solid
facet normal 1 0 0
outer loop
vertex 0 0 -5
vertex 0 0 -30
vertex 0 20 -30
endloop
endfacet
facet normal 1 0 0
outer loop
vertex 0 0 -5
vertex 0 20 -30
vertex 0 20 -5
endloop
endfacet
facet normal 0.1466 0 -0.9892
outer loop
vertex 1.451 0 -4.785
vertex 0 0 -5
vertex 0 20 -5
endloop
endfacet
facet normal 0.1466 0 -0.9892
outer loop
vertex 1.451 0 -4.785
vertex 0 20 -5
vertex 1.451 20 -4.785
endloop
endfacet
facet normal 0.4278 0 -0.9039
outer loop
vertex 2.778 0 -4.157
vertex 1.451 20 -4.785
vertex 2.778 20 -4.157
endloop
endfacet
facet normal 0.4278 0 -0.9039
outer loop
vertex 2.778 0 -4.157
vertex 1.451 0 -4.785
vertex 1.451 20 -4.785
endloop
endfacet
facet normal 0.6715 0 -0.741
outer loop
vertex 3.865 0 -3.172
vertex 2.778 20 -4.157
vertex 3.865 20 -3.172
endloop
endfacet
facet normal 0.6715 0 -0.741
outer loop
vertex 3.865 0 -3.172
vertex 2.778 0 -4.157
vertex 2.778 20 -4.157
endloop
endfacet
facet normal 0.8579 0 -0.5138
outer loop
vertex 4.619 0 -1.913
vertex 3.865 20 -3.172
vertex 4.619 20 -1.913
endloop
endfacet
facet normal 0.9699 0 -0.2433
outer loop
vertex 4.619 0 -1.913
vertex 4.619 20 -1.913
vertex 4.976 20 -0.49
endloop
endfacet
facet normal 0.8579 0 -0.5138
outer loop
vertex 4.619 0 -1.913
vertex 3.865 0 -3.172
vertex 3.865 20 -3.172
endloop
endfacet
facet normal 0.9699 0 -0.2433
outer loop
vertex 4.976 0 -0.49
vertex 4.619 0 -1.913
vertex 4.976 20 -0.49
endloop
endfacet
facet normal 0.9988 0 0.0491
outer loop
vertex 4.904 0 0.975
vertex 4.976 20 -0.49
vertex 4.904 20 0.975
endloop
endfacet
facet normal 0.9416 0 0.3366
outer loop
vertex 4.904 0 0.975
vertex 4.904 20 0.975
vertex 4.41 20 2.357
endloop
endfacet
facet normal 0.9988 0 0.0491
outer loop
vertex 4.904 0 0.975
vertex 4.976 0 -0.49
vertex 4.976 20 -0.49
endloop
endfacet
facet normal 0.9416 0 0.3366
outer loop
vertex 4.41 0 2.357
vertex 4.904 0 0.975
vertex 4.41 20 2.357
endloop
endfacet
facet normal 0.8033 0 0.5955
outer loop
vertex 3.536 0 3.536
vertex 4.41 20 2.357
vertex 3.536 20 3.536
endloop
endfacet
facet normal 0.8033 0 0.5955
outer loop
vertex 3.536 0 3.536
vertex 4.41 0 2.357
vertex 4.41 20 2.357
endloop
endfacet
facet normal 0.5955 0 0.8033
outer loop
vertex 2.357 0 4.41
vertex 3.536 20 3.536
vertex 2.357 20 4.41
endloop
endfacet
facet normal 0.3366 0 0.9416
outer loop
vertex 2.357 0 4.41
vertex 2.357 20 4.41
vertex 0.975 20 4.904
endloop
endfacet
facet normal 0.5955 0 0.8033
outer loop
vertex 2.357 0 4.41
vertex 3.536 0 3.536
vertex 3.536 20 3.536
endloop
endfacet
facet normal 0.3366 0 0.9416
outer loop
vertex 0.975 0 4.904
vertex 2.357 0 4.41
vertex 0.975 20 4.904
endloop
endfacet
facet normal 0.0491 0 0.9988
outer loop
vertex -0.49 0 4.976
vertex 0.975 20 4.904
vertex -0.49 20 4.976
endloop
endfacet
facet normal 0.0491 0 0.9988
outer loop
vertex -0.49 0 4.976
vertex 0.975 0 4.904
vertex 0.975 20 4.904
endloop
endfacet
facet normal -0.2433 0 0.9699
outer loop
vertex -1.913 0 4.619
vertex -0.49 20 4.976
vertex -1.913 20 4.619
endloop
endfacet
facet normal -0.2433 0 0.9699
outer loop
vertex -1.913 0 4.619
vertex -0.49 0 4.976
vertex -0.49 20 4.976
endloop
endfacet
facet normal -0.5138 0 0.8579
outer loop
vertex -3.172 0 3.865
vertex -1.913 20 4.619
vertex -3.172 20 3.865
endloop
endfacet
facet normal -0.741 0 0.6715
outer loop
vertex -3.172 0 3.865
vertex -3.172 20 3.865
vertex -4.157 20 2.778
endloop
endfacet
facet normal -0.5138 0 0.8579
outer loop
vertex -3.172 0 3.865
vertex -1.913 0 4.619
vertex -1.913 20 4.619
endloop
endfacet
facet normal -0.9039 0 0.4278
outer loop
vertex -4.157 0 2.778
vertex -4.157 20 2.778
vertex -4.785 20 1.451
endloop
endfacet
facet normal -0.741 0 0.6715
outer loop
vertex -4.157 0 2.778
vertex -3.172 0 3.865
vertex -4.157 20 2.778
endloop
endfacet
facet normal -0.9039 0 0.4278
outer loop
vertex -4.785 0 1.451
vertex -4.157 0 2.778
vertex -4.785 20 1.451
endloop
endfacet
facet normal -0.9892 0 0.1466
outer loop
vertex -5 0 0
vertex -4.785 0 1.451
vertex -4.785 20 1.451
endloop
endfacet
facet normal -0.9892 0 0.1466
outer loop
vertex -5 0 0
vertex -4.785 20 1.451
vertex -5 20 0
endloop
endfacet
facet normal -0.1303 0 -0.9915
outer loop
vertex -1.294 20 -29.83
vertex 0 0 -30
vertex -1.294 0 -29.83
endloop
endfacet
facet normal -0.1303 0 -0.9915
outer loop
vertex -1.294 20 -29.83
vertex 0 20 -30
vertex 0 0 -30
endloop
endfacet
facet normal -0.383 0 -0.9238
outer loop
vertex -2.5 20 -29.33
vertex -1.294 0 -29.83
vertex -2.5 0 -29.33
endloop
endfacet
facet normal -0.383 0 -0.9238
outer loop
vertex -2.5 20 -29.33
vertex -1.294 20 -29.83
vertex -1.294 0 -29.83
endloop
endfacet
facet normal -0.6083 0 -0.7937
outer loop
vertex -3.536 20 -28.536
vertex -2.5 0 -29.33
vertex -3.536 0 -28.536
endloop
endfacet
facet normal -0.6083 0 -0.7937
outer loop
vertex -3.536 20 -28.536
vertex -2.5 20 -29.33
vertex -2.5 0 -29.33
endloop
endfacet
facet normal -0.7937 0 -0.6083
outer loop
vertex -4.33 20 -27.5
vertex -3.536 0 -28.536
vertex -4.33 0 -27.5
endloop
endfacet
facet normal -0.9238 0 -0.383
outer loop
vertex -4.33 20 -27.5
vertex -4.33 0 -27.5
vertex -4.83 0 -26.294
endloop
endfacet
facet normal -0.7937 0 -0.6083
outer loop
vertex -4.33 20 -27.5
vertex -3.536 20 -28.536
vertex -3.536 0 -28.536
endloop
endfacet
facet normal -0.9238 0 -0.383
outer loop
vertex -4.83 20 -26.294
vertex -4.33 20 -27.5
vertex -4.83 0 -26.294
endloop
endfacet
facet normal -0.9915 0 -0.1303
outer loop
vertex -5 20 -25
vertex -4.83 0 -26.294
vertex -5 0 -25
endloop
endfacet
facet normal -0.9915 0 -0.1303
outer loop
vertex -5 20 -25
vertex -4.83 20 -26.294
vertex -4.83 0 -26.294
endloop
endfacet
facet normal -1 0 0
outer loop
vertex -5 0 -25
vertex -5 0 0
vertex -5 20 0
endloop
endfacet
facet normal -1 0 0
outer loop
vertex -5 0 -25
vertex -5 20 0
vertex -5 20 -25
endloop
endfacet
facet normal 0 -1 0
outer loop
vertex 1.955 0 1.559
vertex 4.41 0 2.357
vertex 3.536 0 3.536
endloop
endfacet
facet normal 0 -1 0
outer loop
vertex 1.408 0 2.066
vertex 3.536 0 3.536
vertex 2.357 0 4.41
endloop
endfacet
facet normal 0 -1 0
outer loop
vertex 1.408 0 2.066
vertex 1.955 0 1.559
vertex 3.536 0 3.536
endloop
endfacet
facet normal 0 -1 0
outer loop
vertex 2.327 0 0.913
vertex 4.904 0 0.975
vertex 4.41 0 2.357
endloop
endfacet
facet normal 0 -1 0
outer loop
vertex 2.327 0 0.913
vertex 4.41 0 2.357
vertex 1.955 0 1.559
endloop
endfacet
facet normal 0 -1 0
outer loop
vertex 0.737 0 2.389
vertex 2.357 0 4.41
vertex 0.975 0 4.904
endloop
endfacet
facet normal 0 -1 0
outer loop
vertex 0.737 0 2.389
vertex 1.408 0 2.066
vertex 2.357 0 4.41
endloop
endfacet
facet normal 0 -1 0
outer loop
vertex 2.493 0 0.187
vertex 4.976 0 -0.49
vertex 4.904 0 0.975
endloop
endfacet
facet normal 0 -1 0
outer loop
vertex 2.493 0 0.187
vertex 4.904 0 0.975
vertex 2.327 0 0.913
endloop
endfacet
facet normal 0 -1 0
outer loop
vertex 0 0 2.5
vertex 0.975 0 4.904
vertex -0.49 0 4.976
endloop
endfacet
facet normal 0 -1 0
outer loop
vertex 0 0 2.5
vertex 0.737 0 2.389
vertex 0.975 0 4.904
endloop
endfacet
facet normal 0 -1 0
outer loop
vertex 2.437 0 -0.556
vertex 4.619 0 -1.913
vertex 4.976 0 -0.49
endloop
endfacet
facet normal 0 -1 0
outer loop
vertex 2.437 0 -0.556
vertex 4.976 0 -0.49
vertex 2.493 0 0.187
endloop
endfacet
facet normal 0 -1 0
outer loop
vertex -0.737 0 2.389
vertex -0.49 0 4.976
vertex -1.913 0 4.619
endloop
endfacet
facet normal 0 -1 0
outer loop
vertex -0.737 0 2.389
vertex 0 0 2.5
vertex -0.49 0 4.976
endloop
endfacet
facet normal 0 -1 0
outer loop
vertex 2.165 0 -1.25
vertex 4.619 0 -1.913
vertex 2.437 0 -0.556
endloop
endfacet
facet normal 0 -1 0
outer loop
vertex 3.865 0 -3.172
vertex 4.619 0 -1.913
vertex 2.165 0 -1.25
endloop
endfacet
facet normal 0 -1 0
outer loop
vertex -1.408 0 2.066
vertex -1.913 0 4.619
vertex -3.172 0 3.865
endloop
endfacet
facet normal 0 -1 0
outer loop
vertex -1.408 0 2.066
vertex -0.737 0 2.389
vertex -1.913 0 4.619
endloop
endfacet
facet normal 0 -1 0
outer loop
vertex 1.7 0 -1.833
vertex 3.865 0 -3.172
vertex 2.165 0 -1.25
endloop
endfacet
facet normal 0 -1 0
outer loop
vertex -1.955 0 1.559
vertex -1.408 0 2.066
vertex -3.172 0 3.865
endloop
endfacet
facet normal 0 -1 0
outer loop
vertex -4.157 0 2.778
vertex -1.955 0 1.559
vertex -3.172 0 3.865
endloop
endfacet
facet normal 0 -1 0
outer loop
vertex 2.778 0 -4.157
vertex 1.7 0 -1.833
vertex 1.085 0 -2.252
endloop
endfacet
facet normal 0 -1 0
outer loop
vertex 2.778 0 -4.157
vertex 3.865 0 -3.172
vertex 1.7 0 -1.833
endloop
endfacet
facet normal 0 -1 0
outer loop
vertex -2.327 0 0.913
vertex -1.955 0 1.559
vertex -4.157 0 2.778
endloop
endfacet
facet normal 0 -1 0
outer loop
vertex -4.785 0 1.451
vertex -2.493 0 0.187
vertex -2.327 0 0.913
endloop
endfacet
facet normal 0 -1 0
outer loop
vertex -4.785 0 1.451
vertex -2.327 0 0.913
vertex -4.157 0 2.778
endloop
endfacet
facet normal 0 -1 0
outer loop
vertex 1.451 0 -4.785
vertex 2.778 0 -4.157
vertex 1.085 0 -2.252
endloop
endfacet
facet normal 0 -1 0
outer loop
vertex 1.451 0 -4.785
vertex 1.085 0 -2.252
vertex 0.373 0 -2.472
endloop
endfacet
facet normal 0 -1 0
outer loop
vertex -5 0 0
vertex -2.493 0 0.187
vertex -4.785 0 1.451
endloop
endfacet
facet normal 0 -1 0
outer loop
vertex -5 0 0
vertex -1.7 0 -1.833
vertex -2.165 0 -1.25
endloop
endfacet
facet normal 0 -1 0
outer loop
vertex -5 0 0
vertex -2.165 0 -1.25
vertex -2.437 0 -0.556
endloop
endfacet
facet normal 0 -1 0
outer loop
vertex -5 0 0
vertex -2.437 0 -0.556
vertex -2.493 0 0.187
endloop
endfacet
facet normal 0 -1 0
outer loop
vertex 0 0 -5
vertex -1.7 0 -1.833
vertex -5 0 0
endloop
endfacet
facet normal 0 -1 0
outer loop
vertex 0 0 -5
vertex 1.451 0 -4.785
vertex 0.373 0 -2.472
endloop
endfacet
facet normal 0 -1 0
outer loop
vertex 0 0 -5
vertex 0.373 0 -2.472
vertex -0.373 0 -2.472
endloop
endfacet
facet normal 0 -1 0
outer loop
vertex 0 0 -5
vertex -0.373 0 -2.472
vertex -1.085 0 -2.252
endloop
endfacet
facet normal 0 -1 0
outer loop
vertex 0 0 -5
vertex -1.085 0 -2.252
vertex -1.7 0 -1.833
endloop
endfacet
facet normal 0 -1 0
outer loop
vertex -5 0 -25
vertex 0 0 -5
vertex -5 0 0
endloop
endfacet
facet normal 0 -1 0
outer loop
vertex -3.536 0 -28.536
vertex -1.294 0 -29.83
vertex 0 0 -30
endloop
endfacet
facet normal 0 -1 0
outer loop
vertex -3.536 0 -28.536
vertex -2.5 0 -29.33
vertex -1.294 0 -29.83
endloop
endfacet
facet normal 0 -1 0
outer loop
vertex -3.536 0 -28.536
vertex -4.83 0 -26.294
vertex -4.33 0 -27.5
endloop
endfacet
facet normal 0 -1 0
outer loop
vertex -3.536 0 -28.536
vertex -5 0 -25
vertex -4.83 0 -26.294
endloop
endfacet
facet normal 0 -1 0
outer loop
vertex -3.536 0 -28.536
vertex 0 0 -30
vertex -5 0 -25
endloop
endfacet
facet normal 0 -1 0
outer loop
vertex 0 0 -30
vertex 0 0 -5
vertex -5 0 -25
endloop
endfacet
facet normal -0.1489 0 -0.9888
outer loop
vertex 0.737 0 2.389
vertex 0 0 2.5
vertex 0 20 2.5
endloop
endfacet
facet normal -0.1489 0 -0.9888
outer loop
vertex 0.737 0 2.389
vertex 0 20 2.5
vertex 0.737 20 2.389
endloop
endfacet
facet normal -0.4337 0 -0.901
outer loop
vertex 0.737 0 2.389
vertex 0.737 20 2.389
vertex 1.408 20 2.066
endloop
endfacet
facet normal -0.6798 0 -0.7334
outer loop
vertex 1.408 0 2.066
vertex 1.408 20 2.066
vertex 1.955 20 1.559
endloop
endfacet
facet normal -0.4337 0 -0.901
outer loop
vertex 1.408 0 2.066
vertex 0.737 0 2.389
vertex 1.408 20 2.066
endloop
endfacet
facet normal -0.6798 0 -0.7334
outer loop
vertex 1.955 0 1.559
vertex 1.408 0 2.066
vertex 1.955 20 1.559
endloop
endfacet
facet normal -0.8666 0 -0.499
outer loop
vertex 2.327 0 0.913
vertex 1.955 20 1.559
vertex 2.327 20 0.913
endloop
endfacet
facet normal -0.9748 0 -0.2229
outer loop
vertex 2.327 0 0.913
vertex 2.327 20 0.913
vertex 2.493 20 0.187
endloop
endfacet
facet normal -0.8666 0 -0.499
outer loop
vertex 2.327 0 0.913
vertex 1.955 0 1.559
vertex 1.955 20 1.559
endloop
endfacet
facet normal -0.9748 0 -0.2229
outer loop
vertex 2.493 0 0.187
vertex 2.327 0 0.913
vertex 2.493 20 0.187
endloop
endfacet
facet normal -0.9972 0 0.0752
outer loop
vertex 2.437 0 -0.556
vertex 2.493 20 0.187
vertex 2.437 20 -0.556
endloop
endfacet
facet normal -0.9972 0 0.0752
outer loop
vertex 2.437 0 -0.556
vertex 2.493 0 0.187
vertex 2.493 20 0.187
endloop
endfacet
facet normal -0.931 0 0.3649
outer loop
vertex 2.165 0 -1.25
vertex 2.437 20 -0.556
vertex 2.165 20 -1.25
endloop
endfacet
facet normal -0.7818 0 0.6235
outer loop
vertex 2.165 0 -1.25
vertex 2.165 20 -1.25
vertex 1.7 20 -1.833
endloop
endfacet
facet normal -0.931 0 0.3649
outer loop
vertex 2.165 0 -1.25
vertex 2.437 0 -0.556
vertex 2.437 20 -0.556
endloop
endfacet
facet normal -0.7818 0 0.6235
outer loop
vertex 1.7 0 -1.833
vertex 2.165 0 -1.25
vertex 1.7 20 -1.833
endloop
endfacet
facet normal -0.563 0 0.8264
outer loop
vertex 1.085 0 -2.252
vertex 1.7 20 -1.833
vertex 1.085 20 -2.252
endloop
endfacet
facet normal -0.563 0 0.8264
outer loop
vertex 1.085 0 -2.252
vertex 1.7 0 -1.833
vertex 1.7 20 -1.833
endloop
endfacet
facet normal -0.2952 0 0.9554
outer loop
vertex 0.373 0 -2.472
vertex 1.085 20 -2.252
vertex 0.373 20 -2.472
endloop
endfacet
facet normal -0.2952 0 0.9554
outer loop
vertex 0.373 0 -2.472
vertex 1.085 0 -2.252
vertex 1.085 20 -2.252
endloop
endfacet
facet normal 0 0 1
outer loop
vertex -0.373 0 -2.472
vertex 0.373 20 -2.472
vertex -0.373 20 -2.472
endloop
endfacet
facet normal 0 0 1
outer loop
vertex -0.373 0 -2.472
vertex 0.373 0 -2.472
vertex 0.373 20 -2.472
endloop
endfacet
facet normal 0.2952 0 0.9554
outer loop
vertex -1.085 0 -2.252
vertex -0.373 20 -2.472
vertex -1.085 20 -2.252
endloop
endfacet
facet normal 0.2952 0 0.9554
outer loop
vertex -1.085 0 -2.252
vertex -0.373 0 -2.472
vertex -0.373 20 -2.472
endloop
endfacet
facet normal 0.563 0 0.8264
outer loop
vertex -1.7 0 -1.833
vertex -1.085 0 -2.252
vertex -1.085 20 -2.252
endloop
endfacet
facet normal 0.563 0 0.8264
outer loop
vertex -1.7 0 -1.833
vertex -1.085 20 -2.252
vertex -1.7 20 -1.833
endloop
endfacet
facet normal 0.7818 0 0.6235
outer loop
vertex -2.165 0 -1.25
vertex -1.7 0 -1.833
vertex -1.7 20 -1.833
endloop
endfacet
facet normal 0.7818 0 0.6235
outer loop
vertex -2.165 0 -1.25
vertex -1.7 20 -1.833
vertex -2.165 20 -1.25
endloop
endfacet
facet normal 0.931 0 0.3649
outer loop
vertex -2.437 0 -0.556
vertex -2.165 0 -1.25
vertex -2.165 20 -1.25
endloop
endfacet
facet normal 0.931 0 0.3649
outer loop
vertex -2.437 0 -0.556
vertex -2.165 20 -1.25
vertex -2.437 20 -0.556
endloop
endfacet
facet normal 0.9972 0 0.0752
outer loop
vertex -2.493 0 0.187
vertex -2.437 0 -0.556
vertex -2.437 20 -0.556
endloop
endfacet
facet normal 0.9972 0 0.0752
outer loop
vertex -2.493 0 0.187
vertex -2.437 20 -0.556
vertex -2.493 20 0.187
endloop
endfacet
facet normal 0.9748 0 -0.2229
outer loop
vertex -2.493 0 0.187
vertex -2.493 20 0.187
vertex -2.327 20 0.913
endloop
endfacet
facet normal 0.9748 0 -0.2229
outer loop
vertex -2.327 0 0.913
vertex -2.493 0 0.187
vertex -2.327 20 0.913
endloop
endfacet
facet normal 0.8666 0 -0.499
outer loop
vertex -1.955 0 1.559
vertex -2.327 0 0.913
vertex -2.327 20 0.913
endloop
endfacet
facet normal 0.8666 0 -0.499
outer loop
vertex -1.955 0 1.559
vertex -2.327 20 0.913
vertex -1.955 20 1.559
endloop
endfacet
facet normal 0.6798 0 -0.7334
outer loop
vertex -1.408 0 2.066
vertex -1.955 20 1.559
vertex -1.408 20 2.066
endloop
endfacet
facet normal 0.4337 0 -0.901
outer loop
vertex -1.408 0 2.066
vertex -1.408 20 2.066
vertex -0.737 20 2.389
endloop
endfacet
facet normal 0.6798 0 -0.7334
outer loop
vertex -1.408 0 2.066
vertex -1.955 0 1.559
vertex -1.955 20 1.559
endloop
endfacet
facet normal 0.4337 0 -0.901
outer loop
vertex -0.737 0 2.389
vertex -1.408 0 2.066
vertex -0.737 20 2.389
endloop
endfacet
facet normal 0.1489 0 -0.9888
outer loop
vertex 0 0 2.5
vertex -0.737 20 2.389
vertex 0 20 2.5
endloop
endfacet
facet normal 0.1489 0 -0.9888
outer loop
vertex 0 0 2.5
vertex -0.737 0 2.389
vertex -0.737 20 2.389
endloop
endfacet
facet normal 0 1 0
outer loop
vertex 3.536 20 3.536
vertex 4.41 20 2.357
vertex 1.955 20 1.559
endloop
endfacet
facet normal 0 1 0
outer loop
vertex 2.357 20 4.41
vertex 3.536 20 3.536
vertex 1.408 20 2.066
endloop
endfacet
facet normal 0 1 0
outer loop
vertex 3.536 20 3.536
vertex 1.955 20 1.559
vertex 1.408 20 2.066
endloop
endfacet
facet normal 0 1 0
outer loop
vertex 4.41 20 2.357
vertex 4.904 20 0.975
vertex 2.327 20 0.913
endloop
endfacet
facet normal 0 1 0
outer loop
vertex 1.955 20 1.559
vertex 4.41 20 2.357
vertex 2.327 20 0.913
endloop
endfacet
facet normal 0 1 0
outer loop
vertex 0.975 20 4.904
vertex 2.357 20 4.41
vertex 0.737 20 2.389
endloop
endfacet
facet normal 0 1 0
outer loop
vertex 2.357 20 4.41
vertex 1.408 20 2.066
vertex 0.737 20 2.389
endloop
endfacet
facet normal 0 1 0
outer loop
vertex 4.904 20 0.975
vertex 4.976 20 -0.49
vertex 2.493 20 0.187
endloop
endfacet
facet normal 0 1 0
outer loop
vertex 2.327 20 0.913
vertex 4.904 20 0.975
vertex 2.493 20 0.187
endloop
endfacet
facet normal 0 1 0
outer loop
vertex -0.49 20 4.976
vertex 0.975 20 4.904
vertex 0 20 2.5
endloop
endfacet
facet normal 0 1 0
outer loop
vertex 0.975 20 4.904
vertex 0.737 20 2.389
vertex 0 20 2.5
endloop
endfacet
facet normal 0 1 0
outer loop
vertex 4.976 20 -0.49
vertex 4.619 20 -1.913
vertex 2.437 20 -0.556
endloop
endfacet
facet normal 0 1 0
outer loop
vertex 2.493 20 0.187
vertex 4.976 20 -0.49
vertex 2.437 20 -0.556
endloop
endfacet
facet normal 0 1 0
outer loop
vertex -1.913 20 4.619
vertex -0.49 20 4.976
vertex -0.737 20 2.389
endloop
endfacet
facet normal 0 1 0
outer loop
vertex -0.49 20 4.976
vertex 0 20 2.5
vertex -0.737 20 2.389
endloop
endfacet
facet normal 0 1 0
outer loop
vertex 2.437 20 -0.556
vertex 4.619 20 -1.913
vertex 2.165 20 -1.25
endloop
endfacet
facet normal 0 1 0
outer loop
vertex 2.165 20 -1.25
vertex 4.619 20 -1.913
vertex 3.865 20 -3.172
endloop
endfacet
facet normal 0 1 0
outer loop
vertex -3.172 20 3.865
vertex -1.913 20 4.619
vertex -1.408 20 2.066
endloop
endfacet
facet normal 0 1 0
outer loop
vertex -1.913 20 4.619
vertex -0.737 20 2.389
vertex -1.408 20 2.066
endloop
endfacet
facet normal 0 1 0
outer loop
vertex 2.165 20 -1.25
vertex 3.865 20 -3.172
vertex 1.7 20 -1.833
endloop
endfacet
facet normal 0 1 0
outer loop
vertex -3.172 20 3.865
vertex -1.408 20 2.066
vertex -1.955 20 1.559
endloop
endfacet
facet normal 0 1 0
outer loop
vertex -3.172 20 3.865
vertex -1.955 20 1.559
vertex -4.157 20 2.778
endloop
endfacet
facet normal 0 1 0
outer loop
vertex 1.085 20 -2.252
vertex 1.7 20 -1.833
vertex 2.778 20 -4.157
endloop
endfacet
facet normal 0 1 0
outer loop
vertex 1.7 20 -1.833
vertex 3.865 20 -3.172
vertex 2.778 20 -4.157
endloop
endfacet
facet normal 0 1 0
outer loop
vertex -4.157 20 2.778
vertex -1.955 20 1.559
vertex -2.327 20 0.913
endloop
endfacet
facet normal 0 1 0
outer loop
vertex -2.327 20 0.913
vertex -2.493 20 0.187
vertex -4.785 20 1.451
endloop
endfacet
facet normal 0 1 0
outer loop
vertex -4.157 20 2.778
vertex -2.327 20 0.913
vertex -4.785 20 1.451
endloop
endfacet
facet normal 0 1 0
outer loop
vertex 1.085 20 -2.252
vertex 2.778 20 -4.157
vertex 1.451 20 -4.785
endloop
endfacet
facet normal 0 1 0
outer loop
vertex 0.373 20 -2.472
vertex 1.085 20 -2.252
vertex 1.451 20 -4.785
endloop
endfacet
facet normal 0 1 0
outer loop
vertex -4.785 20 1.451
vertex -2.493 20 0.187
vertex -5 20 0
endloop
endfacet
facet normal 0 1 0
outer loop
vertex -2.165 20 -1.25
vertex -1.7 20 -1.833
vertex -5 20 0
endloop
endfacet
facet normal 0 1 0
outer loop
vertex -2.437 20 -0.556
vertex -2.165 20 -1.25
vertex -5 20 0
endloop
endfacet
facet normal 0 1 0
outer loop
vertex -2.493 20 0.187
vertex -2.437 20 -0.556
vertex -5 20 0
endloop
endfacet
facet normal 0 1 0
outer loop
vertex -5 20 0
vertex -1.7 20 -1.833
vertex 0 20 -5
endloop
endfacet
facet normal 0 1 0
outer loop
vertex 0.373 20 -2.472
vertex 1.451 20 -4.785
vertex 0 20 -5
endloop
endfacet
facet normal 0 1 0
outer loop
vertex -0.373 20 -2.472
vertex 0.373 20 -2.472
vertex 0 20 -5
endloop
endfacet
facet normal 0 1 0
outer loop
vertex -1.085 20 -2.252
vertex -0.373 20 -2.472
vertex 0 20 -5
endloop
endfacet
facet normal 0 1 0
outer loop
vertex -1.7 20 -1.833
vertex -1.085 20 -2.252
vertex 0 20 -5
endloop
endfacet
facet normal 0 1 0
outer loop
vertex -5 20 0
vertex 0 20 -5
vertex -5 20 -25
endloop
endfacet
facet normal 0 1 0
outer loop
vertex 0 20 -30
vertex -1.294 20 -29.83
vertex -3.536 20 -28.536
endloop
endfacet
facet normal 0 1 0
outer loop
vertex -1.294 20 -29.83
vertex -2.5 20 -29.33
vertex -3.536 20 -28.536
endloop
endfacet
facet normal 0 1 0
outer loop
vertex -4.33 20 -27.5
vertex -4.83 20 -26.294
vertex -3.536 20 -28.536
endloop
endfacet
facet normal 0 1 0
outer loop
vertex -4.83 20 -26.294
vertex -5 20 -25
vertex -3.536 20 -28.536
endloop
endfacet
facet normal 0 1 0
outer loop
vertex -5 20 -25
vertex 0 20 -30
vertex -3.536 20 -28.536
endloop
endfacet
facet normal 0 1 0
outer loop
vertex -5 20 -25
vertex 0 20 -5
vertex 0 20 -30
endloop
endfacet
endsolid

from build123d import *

# Parameters (mm, degrees)
SKETCH1_R           = 2.5
BOSS_EXTRUDE1_DEPTH = 20
FILLET1_R           = 5


with BuildPart() as part:
    # Sketch1 → Boss-Extrude1 (new body)
    with BuildSketch(Plane(origin=(0, 0, 0), x_dir=(1, 0, 0), z_dir=(0, 1, 0))):
        with BuildLine():
            Line((0, 30), (0, 5))
            ThreePointArc((0, 5), (3.535533906, -3.535533906), (-5, 0))
            Line((-5, 0), (-5, 5))
            Line((-5, 5), (-5, 30))
            Line((-5, 30), (0, 30))
        make_face()
        with Locations(Location((0, 0, 0), (0, 0, 270))):
            Circle(SKETCH1_R, mode=Mode.SUBTRACT)
    extrude(amount=BOSS_EXTRUDE1_DEPTH)

    # Fillet1
    fillet1_edges = [part.edges().sort_by_distance(p)[0] for p in [
        (-5, 10, -30),
    ]]
    fillet(fillet1_edges, radius=FILLET1_R - 0.0001)  # a hair under: the kernel refuses the full size


solid = part.part
